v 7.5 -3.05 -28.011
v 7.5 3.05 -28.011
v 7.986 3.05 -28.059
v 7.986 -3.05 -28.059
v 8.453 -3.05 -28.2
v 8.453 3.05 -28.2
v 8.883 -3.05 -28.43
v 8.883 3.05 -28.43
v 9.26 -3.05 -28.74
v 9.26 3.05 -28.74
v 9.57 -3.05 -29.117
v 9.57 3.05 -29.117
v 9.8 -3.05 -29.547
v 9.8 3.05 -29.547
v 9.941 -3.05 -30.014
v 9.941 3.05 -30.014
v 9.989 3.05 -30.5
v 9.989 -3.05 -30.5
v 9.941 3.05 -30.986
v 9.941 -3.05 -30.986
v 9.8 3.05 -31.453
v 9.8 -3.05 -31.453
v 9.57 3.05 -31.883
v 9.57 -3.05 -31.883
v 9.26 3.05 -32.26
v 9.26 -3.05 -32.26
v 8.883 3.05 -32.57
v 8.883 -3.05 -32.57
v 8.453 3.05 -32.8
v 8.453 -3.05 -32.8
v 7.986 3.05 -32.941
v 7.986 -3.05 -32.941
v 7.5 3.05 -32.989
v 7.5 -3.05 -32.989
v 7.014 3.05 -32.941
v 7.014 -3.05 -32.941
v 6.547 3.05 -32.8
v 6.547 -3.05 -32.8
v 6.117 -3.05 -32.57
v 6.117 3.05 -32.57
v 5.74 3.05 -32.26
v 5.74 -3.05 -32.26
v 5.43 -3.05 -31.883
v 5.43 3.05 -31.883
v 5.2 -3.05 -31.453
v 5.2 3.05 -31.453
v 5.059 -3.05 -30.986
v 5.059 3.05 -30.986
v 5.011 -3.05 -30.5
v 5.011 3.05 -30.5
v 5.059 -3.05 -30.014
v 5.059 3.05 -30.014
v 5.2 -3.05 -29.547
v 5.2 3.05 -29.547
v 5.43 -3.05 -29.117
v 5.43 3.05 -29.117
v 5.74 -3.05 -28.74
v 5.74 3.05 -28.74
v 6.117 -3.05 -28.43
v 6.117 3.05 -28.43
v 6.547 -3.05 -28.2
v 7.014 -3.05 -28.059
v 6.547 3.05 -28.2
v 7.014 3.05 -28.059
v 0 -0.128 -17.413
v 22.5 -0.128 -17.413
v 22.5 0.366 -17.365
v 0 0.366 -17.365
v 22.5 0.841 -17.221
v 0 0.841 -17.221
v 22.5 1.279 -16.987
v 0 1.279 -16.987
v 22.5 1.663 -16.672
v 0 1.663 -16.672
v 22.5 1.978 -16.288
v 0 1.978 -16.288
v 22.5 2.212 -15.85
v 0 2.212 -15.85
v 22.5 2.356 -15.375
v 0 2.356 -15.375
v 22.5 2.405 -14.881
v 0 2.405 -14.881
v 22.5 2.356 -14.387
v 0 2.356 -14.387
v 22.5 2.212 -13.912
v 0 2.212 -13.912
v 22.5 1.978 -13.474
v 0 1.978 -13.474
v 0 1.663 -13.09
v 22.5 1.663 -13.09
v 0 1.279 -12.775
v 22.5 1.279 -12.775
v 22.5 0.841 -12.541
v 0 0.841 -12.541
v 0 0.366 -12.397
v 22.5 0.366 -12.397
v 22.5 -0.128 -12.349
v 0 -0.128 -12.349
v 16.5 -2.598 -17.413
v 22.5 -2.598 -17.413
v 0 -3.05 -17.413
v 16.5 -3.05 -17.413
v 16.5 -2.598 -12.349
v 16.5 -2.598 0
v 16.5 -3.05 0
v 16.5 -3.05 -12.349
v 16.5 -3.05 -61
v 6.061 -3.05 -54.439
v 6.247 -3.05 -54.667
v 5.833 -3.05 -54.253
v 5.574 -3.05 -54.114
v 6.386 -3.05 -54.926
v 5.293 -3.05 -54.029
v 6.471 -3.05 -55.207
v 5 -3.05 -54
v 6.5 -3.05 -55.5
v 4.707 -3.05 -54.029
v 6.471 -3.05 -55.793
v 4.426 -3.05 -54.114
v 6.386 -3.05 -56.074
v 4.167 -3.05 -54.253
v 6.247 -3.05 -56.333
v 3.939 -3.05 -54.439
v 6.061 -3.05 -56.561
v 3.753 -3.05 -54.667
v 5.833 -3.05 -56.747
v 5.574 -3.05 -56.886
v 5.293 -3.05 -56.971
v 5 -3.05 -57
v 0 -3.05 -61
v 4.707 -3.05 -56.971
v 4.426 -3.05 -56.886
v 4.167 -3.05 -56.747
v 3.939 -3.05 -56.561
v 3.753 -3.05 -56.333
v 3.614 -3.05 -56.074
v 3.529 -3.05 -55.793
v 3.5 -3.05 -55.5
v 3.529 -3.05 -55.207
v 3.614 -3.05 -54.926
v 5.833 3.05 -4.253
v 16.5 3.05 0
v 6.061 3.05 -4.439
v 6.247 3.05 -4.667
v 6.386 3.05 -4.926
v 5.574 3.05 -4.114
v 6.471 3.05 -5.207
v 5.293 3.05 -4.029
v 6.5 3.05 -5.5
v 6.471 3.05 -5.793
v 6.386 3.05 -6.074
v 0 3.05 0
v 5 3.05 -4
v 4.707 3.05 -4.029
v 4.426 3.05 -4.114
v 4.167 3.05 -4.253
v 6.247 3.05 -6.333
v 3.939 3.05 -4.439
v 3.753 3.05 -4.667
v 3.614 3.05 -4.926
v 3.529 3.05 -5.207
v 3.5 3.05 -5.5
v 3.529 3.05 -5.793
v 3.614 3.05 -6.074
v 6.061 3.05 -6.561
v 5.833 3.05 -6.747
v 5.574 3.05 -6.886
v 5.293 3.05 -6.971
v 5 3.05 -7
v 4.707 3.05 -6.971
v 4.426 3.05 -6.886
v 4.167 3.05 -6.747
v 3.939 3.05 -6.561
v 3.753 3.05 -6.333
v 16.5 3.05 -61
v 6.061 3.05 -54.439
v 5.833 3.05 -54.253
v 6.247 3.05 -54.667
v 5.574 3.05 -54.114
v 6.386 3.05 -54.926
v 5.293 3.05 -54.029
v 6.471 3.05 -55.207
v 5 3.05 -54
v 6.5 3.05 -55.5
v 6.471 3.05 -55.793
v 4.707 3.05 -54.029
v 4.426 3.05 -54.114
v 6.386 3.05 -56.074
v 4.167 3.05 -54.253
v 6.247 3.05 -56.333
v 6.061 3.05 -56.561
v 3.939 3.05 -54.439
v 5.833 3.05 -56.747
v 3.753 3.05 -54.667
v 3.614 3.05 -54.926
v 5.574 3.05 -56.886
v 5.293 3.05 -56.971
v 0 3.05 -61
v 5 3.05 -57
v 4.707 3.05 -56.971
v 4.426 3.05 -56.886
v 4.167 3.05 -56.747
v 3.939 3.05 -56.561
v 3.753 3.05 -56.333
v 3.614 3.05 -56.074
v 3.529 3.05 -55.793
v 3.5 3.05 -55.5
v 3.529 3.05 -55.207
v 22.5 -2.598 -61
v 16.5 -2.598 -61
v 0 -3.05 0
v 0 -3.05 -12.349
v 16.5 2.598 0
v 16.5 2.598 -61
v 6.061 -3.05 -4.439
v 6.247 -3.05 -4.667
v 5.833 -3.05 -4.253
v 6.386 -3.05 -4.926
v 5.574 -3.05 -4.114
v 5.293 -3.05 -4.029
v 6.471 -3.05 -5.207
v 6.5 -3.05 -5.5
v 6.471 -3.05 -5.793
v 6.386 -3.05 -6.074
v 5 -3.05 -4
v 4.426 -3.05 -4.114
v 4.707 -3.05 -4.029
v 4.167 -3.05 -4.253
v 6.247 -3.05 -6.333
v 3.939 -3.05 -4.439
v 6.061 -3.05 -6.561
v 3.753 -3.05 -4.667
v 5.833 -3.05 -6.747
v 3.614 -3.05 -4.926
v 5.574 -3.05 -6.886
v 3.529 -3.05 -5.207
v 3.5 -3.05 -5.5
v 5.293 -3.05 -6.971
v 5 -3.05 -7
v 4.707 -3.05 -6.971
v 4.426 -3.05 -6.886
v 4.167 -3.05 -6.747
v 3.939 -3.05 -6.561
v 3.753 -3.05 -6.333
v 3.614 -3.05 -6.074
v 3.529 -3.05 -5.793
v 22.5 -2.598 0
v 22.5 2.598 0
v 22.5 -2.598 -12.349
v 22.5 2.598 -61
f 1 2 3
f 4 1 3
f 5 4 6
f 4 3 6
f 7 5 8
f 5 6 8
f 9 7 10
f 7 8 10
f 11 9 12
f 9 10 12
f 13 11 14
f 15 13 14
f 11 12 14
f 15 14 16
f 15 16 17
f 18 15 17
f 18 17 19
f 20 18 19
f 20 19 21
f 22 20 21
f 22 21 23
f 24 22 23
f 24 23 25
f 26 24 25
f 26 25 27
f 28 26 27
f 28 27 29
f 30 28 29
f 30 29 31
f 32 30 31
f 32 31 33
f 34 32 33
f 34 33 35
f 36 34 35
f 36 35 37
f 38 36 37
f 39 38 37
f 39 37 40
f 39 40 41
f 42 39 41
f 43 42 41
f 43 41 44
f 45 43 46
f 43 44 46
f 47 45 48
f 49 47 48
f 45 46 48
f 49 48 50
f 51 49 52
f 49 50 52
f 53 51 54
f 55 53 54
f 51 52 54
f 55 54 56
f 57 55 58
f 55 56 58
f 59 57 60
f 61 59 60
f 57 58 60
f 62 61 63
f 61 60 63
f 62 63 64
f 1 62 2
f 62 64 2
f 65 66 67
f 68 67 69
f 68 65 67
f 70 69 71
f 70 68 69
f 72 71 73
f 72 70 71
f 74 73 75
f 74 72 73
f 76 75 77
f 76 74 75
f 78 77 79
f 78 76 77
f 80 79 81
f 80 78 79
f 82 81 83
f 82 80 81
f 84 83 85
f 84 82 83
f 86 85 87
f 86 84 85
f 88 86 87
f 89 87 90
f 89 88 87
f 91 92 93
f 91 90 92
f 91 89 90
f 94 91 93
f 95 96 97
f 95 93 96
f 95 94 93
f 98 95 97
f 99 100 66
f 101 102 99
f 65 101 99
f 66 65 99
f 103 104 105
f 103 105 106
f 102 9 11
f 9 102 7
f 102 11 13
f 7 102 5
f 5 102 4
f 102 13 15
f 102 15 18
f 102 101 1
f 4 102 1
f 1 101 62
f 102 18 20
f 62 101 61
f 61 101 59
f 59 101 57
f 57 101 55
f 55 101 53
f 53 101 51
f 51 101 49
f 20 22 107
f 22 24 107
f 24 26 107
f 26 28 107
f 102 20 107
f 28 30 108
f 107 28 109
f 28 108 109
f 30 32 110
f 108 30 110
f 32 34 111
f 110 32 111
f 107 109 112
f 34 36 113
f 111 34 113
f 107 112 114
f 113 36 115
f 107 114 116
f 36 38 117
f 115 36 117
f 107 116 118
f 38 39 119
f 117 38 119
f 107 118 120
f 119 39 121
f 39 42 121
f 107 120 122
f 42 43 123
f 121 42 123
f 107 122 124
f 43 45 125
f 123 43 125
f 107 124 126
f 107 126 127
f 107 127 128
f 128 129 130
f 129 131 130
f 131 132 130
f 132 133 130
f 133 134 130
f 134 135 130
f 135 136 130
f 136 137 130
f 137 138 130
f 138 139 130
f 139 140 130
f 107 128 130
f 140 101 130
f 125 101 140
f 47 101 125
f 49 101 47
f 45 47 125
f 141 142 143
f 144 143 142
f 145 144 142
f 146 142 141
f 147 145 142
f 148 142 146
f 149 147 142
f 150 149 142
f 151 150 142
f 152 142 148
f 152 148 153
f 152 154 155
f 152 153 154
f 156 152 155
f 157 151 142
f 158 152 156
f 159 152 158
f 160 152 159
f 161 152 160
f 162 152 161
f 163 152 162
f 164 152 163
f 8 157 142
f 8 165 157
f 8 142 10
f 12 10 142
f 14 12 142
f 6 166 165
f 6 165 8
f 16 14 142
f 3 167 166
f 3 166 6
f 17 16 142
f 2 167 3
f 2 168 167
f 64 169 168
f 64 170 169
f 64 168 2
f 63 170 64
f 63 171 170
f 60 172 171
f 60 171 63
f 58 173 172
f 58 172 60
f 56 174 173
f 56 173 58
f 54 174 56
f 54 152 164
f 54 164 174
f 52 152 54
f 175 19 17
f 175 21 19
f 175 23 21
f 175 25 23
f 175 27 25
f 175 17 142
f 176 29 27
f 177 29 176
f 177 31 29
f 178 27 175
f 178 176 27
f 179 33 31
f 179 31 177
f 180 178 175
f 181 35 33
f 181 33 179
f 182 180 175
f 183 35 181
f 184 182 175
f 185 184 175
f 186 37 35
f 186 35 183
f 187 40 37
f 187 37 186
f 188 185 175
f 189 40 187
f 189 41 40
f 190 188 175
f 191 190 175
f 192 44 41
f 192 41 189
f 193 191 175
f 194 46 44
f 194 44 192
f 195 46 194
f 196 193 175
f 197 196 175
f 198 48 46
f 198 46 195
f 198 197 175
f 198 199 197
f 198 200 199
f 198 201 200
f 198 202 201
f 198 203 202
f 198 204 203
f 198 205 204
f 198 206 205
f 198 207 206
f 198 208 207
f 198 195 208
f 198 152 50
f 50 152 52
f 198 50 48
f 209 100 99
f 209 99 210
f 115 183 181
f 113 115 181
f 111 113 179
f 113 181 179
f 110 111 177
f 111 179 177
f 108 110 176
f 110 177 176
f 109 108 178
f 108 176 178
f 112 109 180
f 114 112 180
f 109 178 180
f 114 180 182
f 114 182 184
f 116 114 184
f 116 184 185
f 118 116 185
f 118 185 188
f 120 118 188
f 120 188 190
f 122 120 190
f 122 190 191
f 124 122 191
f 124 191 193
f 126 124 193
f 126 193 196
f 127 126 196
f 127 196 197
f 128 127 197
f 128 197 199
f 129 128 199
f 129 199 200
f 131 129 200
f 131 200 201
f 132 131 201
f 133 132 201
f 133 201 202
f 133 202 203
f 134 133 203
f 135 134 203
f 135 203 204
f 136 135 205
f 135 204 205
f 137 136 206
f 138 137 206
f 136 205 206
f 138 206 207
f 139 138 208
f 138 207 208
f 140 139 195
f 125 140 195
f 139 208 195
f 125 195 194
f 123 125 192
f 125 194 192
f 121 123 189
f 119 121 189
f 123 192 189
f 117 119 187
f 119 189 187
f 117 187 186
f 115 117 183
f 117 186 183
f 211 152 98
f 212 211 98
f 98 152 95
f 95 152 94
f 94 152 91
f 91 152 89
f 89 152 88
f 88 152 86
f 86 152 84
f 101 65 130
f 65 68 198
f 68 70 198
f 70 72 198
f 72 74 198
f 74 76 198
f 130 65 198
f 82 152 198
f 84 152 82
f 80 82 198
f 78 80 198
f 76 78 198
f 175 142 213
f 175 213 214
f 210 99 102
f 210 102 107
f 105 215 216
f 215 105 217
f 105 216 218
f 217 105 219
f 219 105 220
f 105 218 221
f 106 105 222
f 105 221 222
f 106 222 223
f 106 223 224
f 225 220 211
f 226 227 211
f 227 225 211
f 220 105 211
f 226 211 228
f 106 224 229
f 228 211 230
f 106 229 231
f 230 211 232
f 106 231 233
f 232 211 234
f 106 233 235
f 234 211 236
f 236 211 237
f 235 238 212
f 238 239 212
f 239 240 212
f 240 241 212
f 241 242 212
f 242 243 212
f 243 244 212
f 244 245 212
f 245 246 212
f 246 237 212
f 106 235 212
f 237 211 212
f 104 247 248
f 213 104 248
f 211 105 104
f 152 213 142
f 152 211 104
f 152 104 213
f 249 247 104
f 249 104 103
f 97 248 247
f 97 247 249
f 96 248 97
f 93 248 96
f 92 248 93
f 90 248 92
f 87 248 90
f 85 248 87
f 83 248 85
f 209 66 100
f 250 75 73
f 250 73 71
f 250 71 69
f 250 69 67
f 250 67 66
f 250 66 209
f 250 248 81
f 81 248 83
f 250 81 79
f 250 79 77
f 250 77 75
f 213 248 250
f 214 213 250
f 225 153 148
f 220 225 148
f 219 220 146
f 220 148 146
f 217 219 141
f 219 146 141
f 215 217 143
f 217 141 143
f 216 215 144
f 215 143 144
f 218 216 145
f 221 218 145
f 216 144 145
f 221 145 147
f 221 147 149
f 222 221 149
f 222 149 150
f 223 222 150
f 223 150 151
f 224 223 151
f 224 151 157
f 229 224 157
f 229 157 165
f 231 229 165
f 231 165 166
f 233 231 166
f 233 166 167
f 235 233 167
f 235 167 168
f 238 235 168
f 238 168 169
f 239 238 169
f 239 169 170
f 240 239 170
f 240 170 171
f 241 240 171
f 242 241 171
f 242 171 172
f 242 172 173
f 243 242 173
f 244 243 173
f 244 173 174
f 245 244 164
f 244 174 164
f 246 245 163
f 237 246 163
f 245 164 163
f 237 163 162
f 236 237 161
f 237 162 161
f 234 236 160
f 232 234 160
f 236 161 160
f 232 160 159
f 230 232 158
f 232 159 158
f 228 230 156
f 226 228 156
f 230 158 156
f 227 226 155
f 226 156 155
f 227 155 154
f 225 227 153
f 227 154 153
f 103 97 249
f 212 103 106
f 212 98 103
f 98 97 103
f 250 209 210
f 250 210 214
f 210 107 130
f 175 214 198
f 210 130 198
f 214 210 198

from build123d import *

# Parameters (mm, degrees)
SKETCH1_W           = 61
SKETCH1_H           = 6.1
BOSS_EXTRUDE1_DEPTH = 22.5
SKETCH2_OUTSIDE_W   = 76.06
SKETCH2_OUTSIDE_H   = 21.16
SKETCH2_OUTSIDE_W_2 = 61
SKETCH2_OUTSIDE_H_2 = 5.1952
CUT_EXTRUDE1_DEPTH  = 6
CUT_EXTRUDE3_DEPTH  = 23.5
SKETCH6_R           = 2.4892
CUT_EXTRUDE4_DEPTH  = 7.1
SKETCH7_R           = 1.5
CUT_EXTRUDE5_DEPTH  = 7.1


with BuildPart() as part:
    # Sketch1 → Boss-Extrude1 (new body)
    with BuildSketch(Plane(origin=(0, 0, 0), x_dir=(0, 0, -1), z_dir=(1, 0, 0))):
        with Locations((30.5, 0)):
            Rectangle(SKETCH1_W, SKETCH1_H)
    extrude(amount=BOSS_EXTRUDE1_DEPTH)

    # Sketch2 outside → Cut-Extrude1 (cut)
    with BuildSketch(Plane(origin=(22.5, 0, 0), x_dir=(0, 0, -1), z_dir=(1, 0, 0))):
        with Locations((30.5, 0)):
            Rectangle(SKETCH2_OUTSIDE_W, SKETCH2_OUTSIDE_H)
        with Locations((30.5, 0)):
            Rectangle(SKETCH2_OUTSIDE_W_2, SKETCH2_OUTSIDE_H_2, mode=Mode.SUBTRACT)
    extrude(amount=-CUT_EXTRUDE1_DEPTH, mode=Mode.SUBTRACT)

    # Sketch5 → Cut-Extrude3 (cut, through all)
    with BuildSketch(Plane.ZY):
        with BuildLine():
            Line((-12.3486, -0.1278), (-12.3486, -3.05))
            Line((-12.3486, -3.05), (-17.4134, -3.05))
            Line((-17.4134, -3.05), (-17.4134, -0.1278))
            ThreePointArc((-17.4134, -0.1278), (-14.881, 2.4046), (-12.3486, -0.1278))
        make_face()
    extrude(amount=-CUT_EXTRUDE3_DEPTH, mode=Mode.SUBTRACT)

    # Sketch6 → Cut-Extrude4 (cut, through all)
    with BuildSketch(Plane(origin=(0, 3.05, 0), x_dir=(1, 0, 0), z_dir=(0, 1, 0))):
        with Locations(Location((7.5, 30.5, 0), (0, 0, 270))):  # turned: the seam where the file's is
            Circle(SKETCH6_R)
    extrude(amount=-CUT_EXTRUDE4_DEPTH, mode=Mode.SUBTRACT)

    # Sketch7 → Cut-Extrude5 (cut, through all)
    with BuildSketch(Plane(origin=(0, 3.05, 0), x_dir=(1, 0, 0), z_dir=(0, 1, 0))):
        with Locations(Location((5, 55.5, 0), (0, 0, 270))):  # turned: the seam where the file's is
            Circle(SKETCH7_R)
        with Locations(Location((5, 5.5, 0), (0, 0, 270))):  # turned: the seam where the file's is
            Circle(SKETCH7_R)
    extrude(amount=-CUT_EXTRUDE5_DEPTH, mode=Mode.SUBTRACT)


solid = part.part
